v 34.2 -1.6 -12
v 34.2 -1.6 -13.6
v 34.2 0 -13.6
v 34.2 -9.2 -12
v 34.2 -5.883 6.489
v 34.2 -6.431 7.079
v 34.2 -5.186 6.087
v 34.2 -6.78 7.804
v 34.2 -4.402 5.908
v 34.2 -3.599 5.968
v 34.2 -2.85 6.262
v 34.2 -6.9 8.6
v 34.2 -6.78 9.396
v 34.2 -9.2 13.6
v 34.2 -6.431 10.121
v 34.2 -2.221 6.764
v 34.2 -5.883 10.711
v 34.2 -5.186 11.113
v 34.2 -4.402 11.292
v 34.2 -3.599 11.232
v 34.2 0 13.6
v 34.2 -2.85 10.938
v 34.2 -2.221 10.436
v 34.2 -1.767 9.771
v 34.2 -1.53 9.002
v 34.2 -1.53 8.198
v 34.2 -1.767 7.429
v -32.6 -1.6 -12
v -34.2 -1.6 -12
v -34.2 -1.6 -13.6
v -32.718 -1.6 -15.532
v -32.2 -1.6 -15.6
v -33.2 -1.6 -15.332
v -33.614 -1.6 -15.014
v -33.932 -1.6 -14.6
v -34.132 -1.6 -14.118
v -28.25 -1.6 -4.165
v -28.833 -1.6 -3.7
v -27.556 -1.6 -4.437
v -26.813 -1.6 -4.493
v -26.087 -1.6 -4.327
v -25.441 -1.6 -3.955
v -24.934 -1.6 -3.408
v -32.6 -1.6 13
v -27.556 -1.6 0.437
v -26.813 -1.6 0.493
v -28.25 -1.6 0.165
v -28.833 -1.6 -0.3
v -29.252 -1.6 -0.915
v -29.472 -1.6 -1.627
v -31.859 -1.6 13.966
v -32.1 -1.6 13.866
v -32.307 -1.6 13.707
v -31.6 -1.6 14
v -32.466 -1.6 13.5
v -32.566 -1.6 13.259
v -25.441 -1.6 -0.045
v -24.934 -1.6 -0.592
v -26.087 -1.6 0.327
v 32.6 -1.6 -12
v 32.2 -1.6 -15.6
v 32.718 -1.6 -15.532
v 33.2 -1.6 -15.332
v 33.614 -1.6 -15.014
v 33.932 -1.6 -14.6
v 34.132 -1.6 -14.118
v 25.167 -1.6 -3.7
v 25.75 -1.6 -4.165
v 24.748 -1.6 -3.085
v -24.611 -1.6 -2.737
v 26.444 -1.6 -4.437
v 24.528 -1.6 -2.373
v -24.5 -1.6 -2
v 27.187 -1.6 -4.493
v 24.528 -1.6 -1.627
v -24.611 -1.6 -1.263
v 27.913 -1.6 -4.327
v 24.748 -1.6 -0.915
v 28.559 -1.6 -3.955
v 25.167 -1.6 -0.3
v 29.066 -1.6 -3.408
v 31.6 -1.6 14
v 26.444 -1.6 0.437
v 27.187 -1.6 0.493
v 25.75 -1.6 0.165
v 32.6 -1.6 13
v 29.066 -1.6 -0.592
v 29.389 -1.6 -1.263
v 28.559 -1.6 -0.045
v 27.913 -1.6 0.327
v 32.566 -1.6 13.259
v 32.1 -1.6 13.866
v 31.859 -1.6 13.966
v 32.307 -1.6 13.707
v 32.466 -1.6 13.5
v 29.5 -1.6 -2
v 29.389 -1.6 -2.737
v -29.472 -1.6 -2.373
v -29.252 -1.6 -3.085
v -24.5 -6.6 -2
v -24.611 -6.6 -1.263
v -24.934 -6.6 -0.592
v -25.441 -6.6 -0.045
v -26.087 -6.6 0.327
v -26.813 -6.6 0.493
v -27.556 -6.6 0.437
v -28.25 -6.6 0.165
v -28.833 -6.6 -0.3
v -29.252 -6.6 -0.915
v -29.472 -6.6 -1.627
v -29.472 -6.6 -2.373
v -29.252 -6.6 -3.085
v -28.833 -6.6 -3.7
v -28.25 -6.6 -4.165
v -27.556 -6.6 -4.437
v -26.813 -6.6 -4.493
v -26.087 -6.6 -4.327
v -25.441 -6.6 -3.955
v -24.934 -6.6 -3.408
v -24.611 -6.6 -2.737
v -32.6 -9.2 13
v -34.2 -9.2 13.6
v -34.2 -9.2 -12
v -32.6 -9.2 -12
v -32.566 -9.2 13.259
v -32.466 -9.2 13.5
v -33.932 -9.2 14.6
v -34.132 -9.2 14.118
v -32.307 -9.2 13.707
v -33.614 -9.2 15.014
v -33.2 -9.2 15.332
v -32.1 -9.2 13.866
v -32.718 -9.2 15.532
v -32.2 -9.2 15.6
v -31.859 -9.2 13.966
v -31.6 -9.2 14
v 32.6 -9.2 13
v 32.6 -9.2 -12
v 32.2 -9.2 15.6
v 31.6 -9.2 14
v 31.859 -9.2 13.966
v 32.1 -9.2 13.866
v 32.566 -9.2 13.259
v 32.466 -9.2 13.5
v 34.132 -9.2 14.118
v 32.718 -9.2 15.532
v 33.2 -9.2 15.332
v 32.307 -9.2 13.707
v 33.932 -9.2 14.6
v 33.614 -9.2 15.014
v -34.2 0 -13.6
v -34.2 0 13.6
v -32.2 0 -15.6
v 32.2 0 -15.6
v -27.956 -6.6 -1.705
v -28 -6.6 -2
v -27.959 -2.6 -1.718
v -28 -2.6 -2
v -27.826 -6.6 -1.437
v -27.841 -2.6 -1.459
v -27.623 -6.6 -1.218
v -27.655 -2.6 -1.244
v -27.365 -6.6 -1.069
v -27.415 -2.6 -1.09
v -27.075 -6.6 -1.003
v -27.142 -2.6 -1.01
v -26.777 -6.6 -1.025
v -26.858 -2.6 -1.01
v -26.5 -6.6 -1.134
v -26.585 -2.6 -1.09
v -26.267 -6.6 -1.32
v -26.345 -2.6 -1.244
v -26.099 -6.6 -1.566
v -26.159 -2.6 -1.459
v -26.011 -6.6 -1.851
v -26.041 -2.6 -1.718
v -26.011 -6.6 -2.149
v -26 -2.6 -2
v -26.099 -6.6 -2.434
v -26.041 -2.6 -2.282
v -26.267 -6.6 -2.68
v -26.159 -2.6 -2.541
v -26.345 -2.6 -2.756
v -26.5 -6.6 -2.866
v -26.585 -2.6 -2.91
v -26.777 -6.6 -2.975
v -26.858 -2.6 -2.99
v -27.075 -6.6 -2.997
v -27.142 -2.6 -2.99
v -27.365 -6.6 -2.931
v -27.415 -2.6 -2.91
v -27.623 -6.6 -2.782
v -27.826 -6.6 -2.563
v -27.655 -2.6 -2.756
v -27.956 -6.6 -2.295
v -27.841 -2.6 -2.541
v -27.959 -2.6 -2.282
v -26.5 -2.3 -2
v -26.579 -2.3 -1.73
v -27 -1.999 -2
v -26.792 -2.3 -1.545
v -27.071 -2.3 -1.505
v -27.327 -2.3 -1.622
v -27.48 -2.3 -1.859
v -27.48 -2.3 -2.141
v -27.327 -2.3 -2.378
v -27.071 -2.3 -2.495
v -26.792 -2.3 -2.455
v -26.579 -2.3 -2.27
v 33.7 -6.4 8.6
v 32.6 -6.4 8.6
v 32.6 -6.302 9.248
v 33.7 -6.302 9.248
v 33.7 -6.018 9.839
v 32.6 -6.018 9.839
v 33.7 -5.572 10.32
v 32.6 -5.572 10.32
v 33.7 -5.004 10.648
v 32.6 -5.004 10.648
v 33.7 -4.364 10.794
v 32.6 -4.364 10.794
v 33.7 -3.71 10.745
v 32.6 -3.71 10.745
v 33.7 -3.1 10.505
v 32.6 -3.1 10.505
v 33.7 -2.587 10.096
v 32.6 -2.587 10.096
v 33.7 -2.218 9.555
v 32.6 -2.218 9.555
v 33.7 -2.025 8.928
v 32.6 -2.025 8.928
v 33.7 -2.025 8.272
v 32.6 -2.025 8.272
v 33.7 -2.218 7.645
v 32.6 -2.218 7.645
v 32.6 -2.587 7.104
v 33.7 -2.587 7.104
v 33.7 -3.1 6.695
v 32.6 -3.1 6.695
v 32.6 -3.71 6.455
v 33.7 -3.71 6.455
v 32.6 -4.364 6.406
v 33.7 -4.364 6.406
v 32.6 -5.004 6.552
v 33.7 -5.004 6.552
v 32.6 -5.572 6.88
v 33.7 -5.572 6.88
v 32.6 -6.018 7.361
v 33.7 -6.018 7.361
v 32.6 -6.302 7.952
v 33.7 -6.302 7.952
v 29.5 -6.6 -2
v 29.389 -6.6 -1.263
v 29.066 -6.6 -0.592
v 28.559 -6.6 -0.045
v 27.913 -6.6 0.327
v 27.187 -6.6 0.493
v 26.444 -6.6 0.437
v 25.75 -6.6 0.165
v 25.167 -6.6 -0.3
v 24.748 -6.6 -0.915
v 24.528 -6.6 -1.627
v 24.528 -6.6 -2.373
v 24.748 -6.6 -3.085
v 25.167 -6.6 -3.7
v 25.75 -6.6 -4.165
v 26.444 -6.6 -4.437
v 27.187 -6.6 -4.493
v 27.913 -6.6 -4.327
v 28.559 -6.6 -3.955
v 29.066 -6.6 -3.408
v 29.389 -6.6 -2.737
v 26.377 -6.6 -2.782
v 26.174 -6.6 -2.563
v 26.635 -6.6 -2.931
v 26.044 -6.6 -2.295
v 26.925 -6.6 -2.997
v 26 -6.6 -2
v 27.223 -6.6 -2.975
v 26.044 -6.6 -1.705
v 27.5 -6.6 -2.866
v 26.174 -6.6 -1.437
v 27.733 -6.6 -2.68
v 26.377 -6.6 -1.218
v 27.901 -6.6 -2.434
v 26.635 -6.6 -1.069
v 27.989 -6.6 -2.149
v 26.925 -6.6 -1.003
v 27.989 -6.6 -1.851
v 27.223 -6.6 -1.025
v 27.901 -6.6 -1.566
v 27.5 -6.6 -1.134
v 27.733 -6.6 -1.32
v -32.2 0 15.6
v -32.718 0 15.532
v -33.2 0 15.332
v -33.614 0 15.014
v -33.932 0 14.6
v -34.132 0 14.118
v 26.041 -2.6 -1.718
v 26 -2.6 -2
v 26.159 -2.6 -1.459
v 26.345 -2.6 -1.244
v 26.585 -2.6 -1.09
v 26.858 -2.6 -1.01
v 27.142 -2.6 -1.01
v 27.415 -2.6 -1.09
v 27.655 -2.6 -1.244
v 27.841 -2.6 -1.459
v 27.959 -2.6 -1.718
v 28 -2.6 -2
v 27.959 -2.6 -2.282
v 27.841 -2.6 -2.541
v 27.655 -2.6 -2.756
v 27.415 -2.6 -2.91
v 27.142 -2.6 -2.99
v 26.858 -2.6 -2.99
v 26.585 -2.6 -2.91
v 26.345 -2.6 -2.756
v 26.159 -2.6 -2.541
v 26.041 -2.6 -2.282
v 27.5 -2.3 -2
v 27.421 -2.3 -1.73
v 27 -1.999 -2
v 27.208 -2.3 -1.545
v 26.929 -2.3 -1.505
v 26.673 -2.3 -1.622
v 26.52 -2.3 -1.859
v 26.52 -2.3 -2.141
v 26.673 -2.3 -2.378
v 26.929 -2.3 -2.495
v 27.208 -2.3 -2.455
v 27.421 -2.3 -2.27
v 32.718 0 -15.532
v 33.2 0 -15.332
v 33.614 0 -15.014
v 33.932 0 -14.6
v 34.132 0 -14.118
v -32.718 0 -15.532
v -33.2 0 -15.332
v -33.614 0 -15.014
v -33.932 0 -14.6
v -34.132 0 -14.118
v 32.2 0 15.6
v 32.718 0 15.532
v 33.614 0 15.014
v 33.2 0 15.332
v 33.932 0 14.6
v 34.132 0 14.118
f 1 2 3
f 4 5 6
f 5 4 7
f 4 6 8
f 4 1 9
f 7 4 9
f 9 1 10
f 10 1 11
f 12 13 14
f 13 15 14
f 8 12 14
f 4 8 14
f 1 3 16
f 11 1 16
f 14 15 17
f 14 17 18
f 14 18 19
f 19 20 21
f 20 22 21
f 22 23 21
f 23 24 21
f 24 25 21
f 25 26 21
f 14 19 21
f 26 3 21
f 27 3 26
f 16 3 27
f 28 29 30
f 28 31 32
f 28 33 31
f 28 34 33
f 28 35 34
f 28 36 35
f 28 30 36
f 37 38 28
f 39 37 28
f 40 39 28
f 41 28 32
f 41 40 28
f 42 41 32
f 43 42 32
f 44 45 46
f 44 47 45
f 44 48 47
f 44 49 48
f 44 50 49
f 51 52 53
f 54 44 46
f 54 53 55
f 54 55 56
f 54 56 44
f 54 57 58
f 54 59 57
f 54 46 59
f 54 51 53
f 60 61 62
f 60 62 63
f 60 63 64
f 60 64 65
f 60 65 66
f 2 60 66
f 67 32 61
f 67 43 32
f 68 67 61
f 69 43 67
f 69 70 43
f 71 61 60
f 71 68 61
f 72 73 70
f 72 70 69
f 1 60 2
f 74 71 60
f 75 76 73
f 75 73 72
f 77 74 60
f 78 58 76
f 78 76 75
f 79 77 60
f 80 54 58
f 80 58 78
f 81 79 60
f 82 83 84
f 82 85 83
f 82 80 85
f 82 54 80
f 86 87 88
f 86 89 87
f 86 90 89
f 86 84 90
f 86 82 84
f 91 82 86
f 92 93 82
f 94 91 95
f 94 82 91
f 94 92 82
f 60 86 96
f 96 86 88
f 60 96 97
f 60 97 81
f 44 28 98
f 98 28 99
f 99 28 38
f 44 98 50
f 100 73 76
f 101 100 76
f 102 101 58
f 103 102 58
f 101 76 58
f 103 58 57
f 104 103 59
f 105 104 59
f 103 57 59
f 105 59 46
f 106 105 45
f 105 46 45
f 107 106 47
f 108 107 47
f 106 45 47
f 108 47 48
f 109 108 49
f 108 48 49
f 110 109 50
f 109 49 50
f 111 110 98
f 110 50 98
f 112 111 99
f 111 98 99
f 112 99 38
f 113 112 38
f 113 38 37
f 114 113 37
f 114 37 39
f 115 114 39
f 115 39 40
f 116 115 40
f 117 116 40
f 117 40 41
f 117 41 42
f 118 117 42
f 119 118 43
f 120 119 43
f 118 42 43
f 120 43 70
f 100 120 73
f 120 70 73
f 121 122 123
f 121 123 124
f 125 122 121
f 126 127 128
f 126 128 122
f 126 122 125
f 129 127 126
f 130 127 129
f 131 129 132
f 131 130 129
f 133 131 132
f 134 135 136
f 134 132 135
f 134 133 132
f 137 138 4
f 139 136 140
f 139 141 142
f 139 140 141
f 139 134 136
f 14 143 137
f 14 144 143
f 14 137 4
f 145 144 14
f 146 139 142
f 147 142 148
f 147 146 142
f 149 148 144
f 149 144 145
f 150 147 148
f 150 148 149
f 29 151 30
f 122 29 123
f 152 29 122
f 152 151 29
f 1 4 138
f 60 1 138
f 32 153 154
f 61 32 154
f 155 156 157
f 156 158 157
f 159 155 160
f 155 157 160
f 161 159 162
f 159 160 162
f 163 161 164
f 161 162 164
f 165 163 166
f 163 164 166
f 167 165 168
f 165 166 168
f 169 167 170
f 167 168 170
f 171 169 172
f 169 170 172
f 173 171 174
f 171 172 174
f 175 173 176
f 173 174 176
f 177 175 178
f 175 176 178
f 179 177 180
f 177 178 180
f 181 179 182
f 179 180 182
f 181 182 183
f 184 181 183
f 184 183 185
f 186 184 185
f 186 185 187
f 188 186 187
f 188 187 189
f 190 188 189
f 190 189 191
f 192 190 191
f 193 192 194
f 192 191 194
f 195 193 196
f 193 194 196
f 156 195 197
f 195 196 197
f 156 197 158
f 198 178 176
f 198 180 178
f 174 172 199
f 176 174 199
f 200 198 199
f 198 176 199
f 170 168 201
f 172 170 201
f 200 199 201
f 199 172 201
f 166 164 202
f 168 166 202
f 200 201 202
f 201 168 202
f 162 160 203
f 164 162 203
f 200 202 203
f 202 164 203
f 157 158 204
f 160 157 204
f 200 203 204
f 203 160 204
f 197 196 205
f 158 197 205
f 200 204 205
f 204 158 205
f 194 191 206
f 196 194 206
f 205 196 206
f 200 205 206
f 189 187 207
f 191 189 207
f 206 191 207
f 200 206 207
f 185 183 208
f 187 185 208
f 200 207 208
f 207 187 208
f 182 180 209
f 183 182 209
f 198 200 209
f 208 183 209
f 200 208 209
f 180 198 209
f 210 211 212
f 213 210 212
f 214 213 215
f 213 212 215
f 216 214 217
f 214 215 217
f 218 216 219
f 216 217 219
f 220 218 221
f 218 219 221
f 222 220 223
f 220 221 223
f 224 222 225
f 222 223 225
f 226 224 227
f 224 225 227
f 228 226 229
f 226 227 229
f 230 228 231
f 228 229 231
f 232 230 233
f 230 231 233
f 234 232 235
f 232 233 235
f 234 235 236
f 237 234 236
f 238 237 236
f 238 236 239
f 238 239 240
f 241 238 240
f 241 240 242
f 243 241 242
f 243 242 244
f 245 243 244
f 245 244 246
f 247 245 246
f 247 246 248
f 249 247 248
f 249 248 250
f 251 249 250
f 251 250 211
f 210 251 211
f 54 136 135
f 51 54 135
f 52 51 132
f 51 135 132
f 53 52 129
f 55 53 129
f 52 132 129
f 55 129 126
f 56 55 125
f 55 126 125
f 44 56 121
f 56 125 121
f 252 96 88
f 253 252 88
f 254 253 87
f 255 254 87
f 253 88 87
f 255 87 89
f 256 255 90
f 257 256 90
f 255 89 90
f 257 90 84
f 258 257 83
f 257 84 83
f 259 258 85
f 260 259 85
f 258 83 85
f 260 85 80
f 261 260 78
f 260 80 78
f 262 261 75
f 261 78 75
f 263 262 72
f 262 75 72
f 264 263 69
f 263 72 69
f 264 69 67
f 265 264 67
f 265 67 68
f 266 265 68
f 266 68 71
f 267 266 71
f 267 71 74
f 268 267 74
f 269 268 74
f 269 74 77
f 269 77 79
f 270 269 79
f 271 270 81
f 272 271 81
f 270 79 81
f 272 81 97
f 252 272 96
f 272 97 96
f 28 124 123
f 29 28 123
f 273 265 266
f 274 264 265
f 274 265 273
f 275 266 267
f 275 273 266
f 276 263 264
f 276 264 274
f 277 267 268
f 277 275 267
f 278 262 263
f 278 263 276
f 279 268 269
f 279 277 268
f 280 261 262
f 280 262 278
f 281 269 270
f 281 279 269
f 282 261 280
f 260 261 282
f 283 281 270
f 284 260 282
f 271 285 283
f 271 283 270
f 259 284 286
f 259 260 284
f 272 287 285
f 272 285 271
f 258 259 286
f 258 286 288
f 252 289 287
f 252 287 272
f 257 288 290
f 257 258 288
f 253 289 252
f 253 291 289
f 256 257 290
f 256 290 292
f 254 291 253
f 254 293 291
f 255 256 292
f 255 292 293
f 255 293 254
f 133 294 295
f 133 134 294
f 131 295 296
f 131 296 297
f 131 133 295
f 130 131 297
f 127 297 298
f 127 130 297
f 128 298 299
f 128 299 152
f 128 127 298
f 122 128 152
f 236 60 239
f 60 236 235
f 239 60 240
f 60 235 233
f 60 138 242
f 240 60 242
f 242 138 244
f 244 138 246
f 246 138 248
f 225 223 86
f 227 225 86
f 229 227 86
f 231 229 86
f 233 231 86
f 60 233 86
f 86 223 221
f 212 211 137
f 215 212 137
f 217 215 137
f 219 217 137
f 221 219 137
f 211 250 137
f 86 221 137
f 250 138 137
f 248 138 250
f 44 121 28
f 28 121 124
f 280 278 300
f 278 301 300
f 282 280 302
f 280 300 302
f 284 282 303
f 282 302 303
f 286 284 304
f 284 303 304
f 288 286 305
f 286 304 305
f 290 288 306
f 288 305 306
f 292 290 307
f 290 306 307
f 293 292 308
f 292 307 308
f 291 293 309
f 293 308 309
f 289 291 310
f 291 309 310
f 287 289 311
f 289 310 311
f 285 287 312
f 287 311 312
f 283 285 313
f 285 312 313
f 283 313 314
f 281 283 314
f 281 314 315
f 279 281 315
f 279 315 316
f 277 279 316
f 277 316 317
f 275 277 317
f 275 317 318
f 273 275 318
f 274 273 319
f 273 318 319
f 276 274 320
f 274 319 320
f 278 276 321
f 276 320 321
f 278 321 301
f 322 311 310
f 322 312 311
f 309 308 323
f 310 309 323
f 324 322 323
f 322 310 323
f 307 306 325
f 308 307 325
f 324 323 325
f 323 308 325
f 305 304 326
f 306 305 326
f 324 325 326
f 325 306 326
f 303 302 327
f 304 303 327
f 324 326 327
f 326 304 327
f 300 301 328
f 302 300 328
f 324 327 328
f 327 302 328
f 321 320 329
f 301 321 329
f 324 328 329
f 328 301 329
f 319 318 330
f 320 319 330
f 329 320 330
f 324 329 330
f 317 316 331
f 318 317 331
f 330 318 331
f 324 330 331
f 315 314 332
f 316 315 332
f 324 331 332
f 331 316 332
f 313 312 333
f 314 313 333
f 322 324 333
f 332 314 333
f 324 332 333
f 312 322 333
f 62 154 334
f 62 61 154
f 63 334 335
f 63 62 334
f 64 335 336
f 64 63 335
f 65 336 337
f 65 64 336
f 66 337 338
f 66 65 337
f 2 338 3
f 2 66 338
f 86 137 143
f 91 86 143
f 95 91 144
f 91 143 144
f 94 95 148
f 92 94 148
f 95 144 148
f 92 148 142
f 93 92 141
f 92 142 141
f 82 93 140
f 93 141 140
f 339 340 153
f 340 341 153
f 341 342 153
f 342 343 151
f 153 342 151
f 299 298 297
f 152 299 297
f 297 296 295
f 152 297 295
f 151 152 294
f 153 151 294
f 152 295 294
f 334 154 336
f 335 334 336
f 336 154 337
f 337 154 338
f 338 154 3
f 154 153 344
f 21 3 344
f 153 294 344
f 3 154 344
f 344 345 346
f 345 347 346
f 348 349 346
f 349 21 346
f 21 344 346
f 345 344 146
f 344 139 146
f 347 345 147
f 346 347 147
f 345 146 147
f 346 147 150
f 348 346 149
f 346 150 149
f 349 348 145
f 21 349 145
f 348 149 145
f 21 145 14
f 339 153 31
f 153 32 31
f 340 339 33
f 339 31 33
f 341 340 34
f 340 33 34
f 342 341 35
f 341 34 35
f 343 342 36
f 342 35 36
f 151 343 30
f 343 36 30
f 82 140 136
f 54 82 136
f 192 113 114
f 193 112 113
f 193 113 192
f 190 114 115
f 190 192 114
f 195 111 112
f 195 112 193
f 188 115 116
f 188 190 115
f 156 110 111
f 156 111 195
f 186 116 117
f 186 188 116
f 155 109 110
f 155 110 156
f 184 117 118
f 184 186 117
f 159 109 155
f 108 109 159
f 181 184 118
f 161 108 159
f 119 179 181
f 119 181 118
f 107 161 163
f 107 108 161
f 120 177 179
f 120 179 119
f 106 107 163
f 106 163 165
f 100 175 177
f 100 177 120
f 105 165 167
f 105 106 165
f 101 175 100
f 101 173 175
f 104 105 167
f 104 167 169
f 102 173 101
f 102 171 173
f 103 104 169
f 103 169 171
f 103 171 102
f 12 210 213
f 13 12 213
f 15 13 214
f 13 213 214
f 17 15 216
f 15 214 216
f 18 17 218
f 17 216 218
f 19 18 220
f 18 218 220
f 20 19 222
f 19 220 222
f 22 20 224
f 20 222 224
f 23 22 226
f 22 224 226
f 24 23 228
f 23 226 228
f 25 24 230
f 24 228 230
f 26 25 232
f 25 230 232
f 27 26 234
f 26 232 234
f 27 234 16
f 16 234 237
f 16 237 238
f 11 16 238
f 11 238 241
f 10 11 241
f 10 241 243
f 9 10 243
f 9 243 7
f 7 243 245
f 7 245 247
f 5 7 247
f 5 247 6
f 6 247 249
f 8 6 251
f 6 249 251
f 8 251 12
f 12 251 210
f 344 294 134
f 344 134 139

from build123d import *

# Parameters (mm, degrees)
F0_W      = 68.4
F0_H      = 31.2
F1_DEPTH  = 9.2
F3_DEPTH  = 7.6
F4_R      = 2
F5_R      = 2
F6_R      = 2
F7_R      = 2.5
F8_DEPTH  = 5
F10_D     = 2
F10_DEPTH = 4
F10_TIP   = 0.600860619
F12_D     = 2
F12_DEPTH = 4
F12_TIP   = 0.600860619
F13_R     = 2.2
F14_DEPTH = 1.601
F15_SIZE  = 0.5


with BuildPart() as f1:
    # F0 (on Front) → F1 (new body)
    with BuildSketch(Plane.XZ):
        Rectangle(F0_W, F0_H)
    extrude(amount=F1_DEPTH)

    # F2 (on face) → F3 (cut)
    with BuildSketch(Plane.XZ.offset(9.2)):
        with BuildLine():
            ThreePointArc((32.6, 13), (30.8928932188, 12.2928932188), (31.6, 14))
            Line((31.6, 14), (-31.6, 14))
            ThreePointArc((-31.6, 14), (-30.8928932188, 13.7071067812), (-30.6, 13))
            ThreePointArc((-30.6, 13), (-31.6, 12), (-32.6, 13))
            Line((-32.6, 13), (-32.6, -12))
            Line((-32.6, -12), (-34.2, -12))
            Line((-34.2, -12), (-34.2, -15.6))
            Line((-34.2, -15.6), (34.2, -15.6))
            Line((34.2, -15.6), (34.2, -12))
            Line((34.2, -12), (32.6, -12))
            Line((32.6, -12), (32.6, 13))
        make_face()
        with BuildLine():
            ThreePointArc((32.6, 13), (32.3071067812, 13.7071067812), (31.6, 14))
            ThreePointArc((31.6, 14), (30.8928932188, 12.2928932188), (32.6, 13))
        make_face()
        with BuildLine():
            ThreePointArc((-30.6, 13), (-30.8928932188, 13.7071067812), (-31.6, 14))
            ThreePointArc((-31.6, 14), (-32.3071067812, 13.7071067812), (-32.6, 13))
            ThreePointArc((-32.6, 13), (-31.6, 12), (-30.6, 13))
        make_face()
    extrude(amount=-F3_DEPTH, mode=Mode.SUBTRACT)

    # F4
    f4_edges = [f1.edges().sort_by_distance(p)[0] for p in [
        (34.2, -4.6, 15.6),
    ]]
    fillet(f4_edges, radius=F4_R)

    # F5
    f5_edges = [f1.edges().sort_by_distance(p)[0] for p in [
        (-34.2, -4.6, 15.6),
        (-34.2, -0.8, -15.6),
    ]]
    fillet(f5_edges, radius=F5_R)

    # F6
    f6_edges = [f1.edges().sort_by_distance(p)[0] for p in [
        (34.2, -0.8, -15.6),
    ]]
    fillet(f6_edges, radius=F6_R)

    # F7 (on face) → F8 (join)
    with BuildSketch(Plane.XZ.offset(1.6)):
        with Locations((-27, -2)):
            Circle(F7_R)
        with Locations((27, -2)):
            Circle(F7_R)
    extrude(amount=F8_DEPTH)

    # F10
    with Locations(Plane.XZ.offset(6.6)):
        with Locations((-27, -2)):
            Hole(F10_D / 2, depth=F10_DEPTH)
            with Locations((0, 0, -(F10_DEPTH + F10_TIP / 2))):  # 118° drill point
                Cone(0, F10_D / 2, F10_TIP, mode=Mode.SUBTRACT)

    # F12
    with Locations(Plane.XZ.offset(6.6)):
        with Locations((27, -2)):
            Hole(F12_D / 2, depth=F12_DEPTH)
            with Locations((0, 0, -(F12_DEPTH + F12_TIP / 2))):  # 118° drill point
                Cone(0, F12_D / 2, F12_TIP, mode=Mode.SUBTRACT)

    # F13 (on face) → F14 (cut, through all)
    with BuildSketch(Plane(origin=(32.6, 0, 0), x_dir=(0, -1, 0), z_dir=(-1, 0, 0))):
        with Locations((4.2, 8.6)):
            Circle(F13_R)
    extrude(amount=-F14_DEPTH, mode=Mode.SUBTRACT)

    # F15
    f15_edges = [f1.edges().sort_by_distance(p)[0] for p in [
        (34.2, -2, 8.6),
    ]]
    chamfer(f15_edges, length=F15_SIZE)


solid = f1.part
